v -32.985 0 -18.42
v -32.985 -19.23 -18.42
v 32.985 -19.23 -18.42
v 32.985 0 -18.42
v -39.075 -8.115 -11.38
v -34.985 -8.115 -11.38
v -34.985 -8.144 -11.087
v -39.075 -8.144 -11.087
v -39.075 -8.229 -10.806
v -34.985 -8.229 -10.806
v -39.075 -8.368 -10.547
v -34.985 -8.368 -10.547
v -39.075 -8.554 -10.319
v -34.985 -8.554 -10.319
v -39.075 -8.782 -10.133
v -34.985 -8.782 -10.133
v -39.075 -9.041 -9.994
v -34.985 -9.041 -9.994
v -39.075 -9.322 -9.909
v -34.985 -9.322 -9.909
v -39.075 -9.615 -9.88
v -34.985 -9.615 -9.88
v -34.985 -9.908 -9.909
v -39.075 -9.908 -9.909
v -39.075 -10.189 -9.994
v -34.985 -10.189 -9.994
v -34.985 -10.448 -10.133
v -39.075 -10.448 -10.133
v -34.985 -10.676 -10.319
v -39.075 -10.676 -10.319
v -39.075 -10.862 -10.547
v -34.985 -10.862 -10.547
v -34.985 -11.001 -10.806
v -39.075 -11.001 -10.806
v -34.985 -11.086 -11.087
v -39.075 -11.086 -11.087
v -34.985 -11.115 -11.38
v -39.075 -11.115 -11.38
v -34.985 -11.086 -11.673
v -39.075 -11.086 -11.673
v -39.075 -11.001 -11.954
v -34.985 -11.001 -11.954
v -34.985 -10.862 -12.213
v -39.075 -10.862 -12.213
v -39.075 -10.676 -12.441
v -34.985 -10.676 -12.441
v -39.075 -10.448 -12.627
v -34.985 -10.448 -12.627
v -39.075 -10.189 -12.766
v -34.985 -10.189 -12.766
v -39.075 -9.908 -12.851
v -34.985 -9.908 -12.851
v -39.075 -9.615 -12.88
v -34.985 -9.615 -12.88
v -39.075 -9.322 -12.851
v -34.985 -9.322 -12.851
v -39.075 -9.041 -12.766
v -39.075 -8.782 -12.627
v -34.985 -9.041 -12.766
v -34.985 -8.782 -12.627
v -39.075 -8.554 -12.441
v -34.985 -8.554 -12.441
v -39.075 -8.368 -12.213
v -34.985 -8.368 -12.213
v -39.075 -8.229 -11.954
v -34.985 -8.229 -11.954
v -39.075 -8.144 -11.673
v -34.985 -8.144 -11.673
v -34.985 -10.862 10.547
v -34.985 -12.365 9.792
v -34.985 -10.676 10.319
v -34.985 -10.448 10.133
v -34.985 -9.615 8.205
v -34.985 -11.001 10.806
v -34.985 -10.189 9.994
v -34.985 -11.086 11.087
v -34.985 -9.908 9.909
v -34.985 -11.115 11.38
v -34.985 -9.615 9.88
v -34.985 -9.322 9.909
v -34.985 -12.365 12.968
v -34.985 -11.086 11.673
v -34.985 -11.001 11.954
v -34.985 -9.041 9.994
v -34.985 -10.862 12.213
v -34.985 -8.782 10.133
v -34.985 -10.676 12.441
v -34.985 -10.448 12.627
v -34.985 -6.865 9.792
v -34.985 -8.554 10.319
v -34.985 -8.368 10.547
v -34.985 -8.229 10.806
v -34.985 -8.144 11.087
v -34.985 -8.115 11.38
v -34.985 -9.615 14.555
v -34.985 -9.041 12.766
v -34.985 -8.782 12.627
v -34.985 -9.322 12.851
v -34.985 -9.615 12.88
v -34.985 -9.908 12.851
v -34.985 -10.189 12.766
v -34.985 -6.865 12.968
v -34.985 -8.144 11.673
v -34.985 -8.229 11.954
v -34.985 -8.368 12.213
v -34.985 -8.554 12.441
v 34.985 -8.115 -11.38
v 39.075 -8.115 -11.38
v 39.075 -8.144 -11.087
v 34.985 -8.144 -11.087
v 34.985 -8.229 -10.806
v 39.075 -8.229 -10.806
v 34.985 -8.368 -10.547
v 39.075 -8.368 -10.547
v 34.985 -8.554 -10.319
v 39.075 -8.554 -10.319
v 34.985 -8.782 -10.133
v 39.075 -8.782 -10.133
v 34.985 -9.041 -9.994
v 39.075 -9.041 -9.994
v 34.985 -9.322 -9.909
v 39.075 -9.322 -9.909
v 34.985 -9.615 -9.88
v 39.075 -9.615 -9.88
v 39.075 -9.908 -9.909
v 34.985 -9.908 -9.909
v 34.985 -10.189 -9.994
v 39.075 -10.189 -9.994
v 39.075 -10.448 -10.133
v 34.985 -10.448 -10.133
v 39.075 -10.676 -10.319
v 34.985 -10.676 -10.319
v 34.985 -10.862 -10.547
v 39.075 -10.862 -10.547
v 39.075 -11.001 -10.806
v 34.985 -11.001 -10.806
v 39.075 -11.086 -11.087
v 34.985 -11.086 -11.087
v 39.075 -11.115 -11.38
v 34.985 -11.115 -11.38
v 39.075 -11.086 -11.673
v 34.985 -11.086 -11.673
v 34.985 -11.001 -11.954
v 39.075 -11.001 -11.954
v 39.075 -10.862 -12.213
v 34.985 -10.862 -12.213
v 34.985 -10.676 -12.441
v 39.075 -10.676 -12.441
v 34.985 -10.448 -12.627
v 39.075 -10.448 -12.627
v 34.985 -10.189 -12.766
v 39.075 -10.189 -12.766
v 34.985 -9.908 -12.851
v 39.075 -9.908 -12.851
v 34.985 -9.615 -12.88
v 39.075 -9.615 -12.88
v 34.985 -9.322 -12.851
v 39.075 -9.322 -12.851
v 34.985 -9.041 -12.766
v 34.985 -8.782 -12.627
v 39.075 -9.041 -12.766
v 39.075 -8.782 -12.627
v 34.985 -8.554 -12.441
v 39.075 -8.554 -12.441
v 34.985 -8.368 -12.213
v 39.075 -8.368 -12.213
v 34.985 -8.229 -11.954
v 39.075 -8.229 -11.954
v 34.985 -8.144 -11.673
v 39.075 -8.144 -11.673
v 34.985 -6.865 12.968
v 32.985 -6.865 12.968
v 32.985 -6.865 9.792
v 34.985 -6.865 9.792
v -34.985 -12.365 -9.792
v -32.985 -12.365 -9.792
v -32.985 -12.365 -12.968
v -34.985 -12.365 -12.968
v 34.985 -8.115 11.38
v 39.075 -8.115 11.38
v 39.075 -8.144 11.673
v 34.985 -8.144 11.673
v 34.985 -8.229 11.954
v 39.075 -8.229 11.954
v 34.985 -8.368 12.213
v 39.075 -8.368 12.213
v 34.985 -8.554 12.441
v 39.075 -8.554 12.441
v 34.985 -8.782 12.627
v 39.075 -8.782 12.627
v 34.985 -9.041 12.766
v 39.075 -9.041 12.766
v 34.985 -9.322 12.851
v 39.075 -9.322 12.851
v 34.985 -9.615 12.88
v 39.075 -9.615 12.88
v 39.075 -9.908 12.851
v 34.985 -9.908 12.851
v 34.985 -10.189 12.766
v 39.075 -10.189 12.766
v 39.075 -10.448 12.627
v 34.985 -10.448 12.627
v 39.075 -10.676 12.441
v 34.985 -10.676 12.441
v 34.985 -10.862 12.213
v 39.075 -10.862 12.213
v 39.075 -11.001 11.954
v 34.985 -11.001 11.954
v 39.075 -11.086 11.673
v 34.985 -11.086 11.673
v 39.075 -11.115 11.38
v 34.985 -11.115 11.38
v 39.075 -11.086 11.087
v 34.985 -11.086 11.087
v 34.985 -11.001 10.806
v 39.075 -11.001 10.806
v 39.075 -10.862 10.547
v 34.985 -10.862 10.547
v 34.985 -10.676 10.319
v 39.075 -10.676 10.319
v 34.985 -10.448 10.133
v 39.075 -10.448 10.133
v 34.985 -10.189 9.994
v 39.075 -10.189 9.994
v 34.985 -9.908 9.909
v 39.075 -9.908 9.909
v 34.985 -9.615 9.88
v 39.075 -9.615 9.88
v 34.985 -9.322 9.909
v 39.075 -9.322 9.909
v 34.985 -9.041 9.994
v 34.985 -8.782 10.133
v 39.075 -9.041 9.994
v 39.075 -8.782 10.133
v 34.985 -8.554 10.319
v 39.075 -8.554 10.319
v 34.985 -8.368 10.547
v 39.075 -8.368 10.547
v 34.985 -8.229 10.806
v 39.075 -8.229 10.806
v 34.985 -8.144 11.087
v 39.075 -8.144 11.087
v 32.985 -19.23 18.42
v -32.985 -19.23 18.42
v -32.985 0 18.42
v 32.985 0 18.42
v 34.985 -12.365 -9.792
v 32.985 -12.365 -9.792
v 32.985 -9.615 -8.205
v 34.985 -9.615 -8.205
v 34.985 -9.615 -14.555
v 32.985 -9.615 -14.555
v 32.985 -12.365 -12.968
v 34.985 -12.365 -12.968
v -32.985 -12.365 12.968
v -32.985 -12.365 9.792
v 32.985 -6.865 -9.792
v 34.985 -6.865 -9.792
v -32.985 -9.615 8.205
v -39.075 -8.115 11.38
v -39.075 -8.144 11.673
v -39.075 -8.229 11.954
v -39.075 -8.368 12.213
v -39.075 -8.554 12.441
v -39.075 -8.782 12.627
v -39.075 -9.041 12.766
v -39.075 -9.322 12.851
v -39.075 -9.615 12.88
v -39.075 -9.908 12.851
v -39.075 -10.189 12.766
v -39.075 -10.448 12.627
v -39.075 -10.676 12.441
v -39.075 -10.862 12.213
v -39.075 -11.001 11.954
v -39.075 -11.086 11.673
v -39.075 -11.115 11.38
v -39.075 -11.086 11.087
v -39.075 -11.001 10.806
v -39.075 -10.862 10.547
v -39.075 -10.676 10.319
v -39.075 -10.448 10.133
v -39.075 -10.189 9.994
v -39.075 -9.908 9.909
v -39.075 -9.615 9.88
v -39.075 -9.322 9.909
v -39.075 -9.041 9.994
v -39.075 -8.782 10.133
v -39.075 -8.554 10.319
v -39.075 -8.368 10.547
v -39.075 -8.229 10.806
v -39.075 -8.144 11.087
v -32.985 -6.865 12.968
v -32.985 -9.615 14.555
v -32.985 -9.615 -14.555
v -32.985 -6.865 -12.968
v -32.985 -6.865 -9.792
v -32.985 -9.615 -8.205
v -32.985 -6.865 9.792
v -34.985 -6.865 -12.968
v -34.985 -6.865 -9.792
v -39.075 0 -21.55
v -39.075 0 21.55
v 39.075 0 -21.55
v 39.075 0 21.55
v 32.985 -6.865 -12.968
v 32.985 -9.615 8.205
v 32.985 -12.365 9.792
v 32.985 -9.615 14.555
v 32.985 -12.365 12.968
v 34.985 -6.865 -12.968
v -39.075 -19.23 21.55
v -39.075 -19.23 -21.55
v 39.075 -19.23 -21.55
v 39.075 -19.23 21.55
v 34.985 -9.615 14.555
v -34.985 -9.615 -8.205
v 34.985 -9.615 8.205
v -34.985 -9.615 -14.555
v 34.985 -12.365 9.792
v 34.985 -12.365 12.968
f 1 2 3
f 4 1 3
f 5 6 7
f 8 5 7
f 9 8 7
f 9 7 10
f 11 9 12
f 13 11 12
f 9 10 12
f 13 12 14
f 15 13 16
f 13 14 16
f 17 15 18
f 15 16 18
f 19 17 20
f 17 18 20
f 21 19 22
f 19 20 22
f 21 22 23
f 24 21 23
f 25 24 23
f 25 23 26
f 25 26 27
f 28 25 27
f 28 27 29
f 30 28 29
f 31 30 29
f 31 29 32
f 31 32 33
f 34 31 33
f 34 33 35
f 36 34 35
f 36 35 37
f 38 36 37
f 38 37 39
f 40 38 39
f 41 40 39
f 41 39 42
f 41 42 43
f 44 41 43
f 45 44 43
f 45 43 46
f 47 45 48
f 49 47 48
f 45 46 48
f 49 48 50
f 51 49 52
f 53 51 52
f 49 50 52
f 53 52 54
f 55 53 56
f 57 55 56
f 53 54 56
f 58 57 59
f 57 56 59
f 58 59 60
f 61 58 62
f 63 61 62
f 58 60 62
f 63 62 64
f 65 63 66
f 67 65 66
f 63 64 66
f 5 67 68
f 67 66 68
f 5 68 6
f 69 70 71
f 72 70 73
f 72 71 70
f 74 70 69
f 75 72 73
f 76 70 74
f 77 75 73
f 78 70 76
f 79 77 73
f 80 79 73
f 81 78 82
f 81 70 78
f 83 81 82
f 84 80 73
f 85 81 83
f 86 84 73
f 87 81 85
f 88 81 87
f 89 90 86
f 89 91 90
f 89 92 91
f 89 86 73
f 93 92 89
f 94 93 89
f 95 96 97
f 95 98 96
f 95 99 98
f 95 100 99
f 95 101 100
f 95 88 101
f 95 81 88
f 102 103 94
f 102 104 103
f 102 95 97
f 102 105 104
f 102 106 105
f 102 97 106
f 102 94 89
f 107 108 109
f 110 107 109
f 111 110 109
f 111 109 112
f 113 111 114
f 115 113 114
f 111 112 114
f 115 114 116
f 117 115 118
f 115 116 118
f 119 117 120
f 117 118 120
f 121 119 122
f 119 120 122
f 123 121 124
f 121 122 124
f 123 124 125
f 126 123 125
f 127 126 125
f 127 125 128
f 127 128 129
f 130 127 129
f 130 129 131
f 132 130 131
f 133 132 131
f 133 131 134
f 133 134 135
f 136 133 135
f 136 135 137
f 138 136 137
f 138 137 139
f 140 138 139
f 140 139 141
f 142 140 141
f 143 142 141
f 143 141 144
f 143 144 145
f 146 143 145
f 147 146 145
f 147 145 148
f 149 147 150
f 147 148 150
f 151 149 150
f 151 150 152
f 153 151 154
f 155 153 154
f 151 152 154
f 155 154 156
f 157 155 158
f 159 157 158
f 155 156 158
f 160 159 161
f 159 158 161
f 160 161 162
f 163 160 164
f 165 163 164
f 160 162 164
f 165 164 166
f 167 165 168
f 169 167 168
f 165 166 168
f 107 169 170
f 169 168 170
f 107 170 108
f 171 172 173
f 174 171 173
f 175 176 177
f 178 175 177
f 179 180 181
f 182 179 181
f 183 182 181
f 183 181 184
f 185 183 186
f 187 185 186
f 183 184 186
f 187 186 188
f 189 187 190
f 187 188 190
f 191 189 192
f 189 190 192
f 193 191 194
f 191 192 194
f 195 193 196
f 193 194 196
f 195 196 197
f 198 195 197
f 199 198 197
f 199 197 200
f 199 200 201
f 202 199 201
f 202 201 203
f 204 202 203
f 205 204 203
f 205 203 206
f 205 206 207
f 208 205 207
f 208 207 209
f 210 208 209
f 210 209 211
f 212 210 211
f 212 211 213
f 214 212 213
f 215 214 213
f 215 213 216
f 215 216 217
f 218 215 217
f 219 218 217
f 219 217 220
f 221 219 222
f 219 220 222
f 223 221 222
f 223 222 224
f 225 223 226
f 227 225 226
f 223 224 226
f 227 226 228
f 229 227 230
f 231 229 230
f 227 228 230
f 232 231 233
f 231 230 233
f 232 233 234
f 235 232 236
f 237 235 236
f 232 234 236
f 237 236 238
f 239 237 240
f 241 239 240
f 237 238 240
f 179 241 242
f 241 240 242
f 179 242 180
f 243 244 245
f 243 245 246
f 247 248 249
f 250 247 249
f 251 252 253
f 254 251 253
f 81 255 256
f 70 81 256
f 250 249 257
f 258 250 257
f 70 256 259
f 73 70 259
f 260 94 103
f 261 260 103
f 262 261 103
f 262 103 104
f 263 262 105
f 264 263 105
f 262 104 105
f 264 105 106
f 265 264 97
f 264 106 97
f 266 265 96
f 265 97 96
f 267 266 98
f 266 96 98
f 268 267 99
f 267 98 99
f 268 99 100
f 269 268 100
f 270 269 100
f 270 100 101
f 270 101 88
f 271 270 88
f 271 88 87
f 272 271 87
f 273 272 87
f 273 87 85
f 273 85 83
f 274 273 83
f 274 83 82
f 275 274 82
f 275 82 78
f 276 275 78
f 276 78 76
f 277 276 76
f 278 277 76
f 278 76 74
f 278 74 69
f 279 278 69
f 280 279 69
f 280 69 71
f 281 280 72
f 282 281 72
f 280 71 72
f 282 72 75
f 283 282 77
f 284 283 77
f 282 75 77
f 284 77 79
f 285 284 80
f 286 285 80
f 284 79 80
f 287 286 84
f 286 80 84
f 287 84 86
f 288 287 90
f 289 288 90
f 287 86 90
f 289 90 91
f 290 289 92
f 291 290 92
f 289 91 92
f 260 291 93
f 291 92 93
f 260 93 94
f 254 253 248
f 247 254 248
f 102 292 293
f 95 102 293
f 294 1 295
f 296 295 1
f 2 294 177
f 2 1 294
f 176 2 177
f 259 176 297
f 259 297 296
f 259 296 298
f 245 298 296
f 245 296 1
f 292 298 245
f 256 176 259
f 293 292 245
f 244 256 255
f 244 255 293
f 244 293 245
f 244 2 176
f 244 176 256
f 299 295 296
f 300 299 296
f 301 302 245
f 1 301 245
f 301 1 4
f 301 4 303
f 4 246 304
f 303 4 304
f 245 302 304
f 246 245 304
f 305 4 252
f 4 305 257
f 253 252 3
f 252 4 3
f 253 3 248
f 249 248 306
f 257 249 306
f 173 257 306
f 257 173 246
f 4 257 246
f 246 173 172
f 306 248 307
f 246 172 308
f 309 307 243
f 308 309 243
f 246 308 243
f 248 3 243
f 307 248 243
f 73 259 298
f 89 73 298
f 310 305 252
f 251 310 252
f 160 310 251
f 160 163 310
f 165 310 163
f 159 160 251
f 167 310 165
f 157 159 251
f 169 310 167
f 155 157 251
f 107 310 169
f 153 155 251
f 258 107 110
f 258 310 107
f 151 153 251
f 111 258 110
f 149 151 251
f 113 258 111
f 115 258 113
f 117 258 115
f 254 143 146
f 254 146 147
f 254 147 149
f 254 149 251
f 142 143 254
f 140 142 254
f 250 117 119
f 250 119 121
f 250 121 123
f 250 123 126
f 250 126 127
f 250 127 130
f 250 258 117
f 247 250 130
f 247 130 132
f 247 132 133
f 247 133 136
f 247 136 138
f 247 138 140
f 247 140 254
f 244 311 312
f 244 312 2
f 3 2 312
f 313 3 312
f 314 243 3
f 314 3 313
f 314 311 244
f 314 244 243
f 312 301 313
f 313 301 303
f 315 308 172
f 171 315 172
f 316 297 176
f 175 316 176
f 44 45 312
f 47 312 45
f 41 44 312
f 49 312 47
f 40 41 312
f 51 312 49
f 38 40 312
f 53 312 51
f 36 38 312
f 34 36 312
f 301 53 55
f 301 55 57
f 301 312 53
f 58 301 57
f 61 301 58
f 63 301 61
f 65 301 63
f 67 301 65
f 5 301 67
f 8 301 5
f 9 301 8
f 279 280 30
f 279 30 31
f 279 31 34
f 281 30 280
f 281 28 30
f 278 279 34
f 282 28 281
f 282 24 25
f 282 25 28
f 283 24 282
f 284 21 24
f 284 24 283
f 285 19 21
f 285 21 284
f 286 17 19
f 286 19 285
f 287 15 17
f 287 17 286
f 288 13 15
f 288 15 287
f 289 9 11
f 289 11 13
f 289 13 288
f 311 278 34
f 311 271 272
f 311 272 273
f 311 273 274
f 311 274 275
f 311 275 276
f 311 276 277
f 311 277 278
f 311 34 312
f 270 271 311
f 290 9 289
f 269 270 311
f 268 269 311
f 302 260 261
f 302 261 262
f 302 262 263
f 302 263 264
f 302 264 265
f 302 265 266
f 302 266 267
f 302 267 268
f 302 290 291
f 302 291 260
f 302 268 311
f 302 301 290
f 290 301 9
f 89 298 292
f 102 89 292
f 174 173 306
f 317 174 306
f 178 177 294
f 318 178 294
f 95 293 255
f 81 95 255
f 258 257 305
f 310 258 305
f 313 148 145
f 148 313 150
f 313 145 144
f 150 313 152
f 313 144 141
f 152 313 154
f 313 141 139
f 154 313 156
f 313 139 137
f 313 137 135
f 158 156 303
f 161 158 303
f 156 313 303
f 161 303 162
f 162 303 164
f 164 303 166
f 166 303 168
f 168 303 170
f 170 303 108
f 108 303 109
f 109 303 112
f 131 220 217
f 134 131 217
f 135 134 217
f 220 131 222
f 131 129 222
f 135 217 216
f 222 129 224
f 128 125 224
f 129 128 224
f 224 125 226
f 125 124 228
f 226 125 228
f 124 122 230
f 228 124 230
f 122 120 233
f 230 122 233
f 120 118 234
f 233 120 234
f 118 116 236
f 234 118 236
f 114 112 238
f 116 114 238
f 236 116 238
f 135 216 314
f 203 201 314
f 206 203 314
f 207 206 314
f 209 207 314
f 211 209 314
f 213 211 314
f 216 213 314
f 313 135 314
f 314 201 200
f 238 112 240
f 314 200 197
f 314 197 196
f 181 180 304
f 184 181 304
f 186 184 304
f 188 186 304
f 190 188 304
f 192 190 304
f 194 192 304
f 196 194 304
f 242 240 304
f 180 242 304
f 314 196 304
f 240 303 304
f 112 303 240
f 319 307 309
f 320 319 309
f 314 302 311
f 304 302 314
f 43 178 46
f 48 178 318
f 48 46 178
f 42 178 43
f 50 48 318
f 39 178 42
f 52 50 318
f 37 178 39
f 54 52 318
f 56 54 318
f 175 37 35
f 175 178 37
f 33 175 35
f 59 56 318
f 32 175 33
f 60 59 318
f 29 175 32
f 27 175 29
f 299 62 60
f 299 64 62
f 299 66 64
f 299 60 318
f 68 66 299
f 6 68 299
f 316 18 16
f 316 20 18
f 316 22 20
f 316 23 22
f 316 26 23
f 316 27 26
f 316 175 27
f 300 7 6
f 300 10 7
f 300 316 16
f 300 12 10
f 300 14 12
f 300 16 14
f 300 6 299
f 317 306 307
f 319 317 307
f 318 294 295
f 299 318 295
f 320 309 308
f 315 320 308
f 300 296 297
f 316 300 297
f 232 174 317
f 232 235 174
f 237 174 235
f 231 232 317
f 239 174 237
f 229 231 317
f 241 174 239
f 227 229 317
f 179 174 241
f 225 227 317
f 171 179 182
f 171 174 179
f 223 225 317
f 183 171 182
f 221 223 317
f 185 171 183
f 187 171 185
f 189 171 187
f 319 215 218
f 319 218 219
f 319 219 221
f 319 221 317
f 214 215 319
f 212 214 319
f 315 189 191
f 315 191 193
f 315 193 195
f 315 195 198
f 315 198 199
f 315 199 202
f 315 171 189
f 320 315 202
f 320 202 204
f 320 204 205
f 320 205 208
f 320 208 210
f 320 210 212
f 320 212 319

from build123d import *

# Parameters (mm, degrees)
F0_W     = 78.15
F0_H     = 43.1
F1_DEPTH = 19.23
F2_W     = 65.97
F2_H     = 36.84
F3_DEPTH = 35
F4_R     = 1.5
F5_DEPTH = 100000
F8_DEPTH = 2
F9_DEPTH = 2


with BuildPart() as f1:
    # F0 (on Front) → F1 (new body)
    with BuildSketch(Plane.XZ):
        Rectangle(F0_W, F0_H)
    extrude(amount=F1_DEPTH)

    # F2 (on face) → F3 (cut)
    with BuildSketch(Plane.XZ.offset(19.23)):
        Rectangle(F2_W, F2_H)
    extrude(amount=-F3_DEPTH, mode=Mode.SUBTRACT)

    # F4 (on face) → F5 (cut)
    with BuildSketch(Plane.YZ.offset(39.075)):
        with Locations((-9.615, 11.38)):
            Circle(F4_R)
        with Locations((-9.615, -11.38)):
            Circle(F4_R)
    extrude(amount=-F5_DEPTH, mode=Mode.SUBTRACT)

    # F7 (on face) → F8 (cut)
    with BuildSketch(Plane(origin=(32.985, 0, 0), x_dir=(0, -1, 0), z_dir=(-1, 0, 0))):
        Polygon((12.365, 9.792287), (12.365, 12.967713), (9.615, 14.555426), (6.865, 12.967713), (6.865, 9.792287), (9.615, 8.204574), align=None)
        Polygon((6.865, -12.967713), (9.615, -14.555426), (12.365, -12.967713), (12.365, -9.792287), (9.615, -8.204574), (6.865, -9.792287), align=None)
    extrude(amount=-F8_DEPTH, mode=Mode.SUBTRACT)

    # F6 (on face) → F9 (cut)
    with BuildSketch(Plane.YZ.offset(-32.985)):
        Polygon((-6.865, 9.792287), (-6.865, 12.967713), (-9.615, 14.555426), (-12.365, 12.967713), (-12.365, 9.792287), (-9.615, 8.204574), align=None)
        Polygon((-12.365, -12.967713), (-9.615, -14.555426), (-6.865, -12.967713), (-6.865, -9.792287), (-9.615, -8.204574), (-12.365, -9.792287), align=None)
    extrude(amount=-F9_DEPTH, mode=Mode.SUBTRACT)


solid = f1.part
